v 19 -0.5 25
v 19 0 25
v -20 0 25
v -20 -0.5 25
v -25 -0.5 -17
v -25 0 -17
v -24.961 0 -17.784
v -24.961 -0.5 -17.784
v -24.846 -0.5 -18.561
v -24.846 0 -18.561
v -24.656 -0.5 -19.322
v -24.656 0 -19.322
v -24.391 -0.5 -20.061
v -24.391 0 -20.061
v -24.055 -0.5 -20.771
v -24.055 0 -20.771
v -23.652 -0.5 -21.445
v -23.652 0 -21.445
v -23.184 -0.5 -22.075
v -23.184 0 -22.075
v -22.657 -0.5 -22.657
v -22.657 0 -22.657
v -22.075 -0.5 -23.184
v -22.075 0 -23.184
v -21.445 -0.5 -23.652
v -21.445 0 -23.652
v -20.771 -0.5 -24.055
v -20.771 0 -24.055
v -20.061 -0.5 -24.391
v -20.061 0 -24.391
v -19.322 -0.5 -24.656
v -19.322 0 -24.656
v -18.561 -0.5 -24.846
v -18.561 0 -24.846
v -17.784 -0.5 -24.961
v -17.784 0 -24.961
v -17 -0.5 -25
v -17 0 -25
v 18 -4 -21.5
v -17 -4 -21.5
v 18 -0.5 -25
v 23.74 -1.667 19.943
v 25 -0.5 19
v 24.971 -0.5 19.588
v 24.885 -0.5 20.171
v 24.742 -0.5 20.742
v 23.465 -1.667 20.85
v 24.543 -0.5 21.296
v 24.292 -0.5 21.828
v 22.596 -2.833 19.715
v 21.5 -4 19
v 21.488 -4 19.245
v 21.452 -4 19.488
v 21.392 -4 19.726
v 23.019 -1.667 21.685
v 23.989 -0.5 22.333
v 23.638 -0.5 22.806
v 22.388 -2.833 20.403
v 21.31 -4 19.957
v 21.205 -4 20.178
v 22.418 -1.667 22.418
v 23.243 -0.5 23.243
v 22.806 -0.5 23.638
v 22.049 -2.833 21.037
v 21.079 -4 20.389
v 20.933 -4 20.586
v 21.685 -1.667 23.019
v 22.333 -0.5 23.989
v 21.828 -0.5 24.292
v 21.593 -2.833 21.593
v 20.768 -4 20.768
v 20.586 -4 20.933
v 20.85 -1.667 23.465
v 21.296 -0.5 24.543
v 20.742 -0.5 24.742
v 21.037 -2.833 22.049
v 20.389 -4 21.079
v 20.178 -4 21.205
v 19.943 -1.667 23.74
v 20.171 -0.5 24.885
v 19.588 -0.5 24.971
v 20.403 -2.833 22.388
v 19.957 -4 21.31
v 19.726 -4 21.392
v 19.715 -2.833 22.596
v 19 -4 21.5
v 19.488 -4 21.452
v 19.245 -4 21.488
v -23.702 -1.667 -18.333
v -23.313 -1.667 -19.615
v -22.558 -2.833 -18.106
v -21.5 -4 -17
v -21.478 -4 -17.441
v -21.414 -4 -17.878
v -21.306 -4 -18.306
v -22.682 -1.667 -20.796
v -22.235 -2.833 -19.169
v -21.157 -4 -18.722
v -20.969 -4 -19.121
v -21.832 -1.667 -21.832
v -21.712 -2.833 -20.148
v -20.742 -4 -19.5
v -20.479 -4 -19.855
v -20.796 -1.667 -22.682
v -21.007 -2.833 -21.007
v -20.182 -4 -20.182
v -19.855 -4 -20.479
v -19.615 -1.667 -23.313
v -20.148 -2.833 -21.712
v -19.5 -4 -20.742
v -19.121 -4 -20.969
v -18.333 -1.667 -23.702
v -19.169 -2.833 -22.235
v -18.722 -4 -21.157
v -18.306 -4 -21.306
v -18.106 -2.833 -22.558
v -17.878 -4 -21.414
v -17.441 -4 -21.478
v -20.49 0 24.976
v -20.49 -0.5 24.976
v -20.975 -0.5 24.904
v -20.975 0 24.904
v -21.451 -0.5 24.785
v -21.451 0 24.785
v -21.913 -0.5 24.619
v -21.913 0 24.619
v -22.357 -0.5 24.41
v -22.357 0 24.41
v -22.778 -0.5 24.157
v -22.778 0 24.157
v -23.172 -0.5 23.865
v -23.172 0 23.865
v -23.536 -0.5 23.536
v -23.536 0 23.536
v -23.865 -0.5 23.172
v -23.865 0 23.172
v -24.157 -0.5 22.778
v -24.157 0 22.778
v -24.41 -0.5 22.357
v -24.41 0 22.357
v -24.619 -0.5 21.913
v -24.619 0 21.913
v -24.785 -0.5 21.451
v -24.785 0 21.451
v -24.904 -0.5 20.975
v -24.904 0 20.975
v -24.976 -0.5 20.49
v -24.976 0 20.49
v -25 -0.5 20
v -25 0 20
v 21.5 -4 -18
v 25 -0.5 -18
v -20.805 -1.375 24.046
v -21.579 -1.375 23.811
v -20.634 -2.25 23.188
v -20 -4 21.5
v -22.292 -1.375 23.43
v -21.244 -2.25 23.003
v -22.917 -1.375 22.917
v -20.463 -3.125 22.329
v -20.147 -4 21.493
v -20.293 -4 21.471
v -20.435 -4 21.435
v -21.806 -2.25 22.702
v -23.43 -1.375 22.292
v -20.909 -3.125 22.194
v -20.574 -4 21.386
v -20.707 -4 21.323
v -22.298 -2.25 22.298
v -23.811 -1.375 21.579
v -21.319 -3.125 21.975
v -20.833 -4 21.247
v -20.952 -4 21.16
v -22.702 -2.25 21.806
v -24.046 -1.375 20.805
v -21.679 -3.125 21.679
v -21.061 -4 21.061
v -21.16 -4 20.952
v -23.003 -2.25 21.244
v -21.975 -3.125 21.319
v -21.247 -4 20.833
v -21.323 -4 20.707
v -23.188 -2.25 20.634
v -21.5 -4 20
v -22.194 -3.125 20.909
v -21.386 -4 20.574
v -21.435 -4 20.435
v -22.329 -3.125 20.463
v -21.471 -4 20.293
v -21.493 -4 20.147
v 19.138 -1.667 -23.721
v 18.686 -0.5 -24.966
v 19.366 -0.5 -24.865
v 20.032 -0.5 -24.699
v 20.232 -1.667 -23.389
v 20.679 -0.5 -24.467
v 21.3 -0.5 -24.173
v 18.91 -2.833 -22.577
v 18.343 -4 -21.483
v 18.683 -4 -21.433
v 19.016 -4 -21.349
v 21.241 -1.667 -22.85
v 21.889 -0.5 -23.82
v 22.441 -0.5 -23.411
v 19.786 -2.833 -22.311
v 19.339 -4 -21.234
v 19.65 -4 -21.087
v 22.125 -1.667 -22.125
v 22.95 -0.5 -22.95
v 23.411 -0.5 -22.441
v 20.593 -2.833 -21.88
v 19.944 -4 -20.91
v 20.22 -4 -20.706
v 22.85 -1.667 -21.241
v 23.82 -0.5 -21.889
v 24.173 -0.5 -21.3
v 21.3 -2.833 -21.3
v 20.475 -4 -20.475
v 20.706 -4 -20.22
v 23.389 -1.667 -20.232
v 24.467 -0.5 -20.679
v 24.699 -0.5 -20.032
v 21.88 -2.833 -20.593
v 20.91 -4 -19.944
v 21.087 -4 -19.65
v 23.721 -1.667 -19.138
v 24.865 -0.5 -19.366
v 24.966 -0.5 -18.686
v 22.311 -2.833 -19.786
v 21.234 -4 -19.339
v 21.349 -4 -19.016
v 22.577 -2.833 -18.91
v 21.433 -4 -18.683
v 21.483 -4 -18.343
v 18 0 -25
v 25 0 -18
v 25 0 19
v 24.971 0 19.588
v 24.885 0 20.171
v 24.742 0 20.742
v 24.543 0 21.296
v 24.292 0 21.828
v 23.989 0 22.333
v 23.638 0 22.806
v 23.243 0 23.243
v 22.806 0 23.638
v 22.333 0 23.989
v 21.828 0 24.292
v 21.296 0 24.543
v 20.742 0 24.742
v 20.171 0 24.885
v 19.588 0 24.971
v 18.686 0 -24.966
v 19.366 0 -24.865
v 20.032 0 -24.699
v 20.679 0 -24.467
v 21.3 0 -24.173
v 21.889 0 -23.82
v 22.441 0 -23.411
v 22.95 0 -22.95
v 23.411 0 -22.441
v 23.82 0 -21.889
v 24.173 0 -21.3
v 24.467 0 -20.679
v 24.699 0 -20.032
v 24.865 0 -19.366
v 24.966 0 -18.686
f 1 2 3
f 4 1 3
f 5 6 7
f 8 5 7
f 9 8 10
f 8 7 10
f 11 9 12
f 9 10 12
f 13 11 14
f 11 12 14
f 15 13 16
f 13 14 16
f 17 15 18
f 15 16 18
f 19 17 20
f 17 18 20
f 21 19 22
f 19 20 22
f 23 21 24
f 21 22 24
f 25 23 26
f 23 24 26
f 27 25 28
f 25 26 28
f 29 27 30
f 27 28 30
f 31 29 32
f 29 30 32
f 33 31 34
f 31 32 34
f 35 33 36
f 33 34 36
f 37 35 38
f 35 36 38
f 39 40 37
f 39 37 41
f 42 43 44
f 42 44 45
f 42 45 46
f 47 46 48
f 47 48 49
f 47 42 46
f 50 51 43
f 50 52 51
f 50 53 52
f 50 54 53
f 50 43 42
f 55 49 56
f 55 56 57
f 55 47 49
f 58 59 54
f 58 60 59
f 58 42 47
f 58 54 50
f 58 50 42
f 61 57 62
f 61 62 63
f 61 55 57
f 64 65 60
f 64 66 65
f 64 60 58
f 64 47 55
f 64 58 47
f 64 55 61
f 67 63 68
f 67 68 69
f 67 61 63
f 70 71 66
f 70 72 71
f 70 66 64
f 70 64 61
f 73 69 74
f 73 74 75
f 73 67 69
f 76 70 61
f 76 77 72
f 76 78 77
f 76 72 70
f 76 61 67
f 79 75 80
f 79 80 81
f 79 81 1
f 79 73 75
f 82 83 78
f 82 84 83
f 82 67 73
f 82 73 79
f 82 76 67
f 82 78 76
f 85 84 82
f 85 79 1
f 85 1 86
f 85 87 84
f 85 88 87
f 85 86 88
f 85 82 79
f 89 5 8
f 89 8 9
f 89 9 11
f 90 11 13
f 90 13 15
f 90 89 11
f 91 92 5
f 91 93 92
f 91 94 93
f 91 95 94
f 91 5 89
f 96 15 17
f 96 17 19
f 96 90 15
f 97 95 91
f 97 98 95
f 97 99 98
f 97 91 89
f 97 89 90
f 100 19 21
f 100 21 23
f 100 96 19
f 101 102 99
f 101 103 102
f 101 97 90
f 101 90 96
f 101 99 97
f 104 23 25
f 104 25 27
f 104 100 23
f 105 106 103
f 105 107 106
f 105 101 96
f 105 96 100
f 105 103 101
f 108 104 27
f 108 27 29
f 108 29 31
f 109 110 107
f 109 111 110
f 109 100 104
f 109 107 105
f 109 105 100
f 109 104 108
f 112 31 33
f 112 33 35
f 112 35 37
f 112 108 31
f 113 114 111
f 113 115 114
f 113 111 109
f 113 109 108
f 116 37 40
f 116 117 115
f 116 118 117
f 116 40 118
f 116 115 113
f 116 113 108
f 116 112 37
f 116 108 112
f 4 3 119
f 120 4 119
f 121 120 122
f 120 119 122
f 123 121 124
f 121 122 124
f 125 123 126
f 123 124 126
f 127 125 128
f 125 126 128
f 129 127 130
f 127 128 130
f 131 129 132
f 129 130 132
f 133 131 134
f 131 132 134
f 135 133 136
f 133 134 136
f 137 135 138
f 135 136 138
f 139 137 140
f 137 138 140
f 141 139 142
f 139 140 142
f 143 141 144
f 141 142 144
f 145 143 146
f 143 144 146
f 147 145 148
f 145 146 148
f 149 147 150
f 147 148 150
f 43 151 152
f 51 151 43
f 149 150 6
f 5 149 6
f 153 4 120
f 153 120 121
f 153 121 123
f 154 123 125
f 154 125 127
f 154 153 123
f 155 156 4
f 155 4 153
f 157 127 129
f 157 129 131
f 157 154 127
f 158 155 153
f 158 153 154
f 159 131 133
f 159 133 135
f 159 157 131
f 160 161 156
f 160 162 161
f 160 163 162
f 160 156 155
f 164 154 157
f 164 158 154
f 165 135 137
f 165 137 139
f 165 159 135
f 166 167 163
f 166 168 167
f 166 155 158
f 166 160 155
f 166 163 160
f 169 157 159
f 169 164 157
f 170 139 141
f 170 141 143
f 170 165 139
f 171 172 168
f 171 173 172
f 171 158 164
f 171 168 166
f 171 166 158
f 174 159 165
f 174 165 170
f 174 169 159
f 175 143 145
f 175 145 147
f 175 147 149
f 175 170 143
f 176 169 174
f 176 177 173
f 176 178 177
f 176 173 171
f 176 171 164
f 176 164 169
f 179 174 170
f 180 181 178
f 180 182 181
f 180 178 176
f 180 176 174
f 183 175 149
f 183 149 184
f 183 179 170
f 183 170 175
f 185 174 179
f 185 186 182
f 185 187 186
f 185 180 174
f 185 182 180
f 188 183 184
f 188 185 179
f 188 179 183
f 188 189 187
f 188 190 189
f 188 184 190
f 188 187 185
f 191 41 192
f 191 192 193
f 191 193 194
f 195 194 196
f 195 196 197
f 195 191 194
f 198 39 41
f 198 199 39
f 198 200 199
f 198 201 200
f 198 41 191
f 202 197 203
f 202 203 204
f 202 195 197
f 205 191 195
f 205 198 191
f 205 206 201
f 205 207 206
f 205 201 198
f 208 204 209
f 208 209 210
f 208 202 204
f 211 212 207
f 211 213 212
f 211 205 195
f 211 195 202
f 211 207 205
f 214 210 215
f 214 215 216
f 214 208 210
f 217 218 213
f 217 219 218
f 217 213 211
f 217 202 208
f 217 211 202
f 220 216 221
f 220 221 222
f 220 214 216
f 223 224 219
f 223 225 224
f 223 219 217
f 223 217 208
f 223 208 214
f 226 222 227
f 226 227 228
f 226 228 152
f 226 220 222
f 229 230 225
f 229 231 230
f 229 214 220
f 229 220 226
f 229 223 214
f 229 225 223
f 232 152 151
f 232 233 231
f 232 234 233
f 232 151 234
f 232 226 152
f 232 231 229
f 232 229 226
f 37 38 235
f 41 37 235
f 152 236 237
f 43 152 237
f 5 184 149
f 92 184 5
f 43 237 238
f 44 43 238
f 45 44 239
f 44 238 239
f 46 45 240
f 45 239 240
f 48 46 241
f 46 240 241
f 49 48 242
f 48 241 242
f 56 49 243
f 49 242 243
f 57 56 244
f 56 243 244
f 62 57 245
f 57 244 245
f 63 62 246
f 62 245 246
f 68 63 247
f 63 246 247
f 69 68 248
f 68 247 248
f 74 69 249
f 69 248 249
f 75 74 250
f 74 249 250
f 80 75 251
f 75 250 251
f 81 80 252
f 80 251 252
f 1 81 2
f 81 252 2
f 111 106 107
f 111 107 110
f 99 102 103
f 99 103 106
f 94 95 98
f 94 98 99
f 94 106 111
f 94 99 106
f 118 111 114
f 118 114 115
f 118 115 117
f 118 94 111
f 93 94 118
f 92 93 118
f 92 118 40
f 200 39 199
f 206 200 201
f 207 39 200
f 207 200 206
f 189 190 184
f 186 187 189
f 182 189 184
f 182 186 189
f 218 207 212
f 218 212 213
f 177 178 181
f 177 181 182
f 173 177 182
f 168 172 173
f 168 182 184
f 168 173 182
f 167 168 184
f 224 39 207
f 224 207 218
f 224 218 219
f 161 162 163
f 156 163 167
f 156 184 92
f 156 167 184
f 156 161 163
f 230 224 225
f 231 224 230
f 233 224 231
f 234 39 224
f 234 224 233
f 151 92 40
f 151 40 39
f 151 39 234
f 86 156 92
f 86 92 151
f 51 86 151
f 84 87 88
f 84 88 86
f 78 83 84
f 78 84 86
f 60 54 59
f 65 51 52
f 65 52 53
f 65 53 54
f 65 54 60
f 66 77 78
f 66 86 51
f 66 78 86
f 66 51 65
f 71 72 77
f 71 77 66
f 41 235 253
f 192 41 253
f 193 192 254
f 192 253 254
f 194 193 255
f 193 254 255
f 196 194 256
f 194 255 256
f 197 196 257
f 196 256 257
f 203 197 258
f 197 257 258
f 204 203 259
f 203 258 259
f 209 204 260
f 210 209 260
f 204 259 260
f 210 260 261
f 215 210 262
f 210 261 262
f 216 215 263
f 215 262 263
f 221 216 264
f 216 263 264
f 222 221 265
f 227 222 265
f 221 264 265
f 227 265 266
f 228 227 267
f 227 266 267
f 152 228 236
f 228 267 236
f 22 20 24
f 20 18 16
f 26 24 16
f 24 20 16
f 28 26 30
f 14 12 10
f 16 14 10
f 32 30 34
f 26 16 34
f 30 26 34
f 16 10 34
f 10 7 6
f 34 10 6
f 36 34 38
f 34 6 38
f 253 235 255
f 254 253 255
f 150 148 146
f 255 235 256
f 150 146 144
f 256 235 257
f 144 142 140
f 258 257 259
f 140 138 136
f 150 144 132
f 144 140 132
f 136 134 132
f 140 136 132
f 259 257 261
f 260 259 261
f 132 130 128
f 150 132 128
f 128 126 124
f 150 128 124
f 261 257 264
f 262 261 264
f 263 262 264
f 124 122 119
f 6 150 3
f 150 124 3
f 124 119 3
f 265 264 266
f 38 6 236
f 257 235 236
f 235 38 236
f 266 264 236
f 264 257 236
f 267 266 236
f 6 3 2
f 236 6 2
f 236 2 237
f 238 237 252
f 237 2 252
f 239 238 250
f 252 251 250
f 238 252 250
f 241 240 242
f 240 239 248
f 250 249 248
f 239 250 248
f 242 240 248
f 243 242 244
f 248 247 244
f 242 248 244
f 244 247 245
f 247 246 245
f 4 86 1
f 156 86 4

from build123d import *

# Parameters (mm, degrees)
F1_DEPTH = 4
F2_SIZE  = 3.5


with BuildPart() as f1:
    # F0 (on Front) → F1 (new body)
    with BuildSketch(Plane.XZ):
        with BuildLine():
            ThreePointArc((25, 19), (23.242641, 23.242641), (19, 25))
            Line((19, 25), (-20, 25))
            ThreePointArc((-20, 25), (-23.535534, 23.535534), (-25, 20))
            Line((-25, 20), (-25, -17))
            ThreePointArc((-25, -17), (-22.656854, -22.656854), (-17, -25))
            Line((-17, -25), (18, -25))
            ThreePointArc((18, -25), (22.949747, -22.949747), (25, -18))
            Line((25, -18), (25, 19))
        make_face()
    extrude(amount=F1_DEPTH)

    # F2
    f2_edges = [f1.edges().sort_by_distance(p)[0] for p in [
        (23.242641, -4, 23.242641),
        (-0.5, -4, 25),
        (-23.535534, -4, 23.535534),
        (-25, -4, 1.5),
        (-22.656854, -4, -22.656854),
        (0.5, -4, -25),
        (22.949747, -4, -22.949747),
        (25, -4, 0.5),
    ]]
    chamfer(f2_edges, length=F2_SIZE)


solid = f1.part
